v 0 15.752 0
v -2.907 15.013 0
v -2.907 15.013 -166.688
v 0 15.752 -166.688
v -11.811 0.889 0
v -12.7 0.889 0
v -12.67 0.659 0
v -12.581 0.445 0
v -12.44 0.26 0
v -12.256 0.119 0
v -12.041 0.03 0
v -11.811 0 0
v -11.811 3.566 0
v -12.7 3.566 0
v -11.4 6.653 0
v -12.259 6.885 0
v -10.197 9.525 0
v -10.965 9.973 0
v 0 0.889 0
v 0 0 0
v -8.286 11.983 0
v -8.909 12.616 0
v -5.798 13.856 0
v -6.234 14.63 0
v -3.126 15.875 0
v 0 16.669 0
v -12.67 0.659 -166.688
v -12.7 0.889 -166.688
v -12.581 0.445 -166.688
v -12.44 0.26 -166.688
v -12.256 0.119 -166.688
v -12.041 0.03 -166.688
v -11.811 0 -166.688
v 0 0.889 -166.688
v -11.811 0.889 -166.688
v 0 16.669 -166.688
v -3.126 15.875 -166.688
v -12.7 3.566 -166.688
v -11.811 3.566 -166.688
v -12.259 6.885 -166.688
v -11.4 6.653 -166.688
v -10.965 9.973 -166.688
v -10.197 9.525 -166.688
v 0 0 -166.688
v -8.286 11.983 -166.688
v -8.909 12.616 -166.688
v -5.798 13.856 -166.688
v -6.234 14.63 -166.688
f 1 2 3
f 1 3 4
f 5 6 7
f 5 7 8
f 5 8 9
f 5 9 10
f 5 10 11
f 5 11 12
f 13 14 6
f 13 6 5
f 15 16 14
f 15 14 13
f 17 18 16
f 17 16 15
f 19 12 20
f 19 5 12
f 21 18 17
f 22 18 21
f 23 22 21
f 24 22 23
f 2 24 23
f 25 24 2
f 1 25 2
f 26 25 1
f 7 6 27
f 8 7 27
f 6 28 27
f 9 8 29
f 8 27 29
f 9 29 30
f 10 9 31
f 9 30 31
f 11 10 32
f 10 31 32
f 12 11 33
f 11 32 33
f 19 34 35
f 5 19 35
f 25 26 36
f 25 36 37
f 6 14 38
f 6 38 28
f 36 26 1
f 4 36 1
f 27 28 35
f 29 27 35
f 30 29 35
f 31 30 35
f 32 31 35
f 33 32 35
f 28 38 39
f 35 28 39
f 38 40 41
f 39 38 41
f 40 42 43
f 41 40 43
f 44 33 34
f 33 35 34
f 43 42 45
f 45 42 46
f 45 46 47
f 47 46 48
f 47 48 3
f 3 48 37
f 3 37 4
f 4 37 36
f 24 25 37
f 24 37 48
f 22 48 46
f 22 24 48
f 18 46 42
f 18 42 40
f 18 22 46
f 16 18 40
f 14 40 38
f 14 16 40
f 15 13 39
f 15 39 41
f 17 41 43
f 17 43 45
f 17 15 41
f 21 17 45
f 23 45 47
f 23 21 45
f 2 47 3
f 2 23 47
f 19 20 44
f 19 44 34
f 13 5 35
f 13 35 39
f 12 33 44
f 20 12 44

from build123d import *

# Parameters (mm, degrees)
EXTRUDE_THIN1_DEPTH     = 166.6875
FILLET1_R               = 0.889
CUT_EXTRUDE1_DEPTH      = 1
CUT_EXTRUDE1_DEPTH_BACK = 167.6875


with BuildPart() as part:
    # Sketch1 → Extrude-Thin1 (new body)
    with BuildSketch(Plane.XY):
        with BuildLine():
            Line((0, 16.66875), (-3.125784133, 15.875))
            ThreePointArc((-3.125784133, 15.875), (-10.024656066, 11.362871681), (-12.7, 3.565675341))
            Line((-12.7, 3.565675341), (-12.7, 0))
            Line((-12.7, 0), (0, 0))
            Line((0, 0), (0, 0.889))
            Line((0, 0.889), (-11.811, 0.889))
            Line((-11.811, 0.889), (-11.811, 3.565675341))
            ThreePointArc((-11.811, 3.565675341), (-9.322930142, 10.817067937), (-2.906979244, 15.013347274))
            Line((-2.906979244, 15.013347274), (0.218804889, 15.807097274))
            Line((0.218804889, 15.807097274), (0, 16.66875))
        make_face()
    extrude(amount=-EXTRUDE_THIN1_DEPTH)

    # Fillet1
    fillet1_edges = [part.edges().sort_by_distance(p)[0] for p in [
        (-12.7, 0, -83.34375),
    ]]
    fillet(fillet1_edges, radius=FILLET1_R)

    # Sketch2 → Cut-Extrude1 (cut, two sides)
    with BuildSketch(Plane.XY) as cut_extrude1_sk:
        Polygon((0, -55.634586178), (0, 0.889), (0, 19.48899735), (0, 76.012583528), (113.047172356, 76.012583528), (113.047172356, -55.634586178), align=None)
    extrude(amount=CUT_EXTRUDE1_DEPTH, mode=Mode.SUBTRACT)
    extrude(cut_extrude1_sk.sketch, amount=-CUT_EXTRUDE1_DEPTH_BACK, mode=Mode.SUBTRACT)


solid = part.part
